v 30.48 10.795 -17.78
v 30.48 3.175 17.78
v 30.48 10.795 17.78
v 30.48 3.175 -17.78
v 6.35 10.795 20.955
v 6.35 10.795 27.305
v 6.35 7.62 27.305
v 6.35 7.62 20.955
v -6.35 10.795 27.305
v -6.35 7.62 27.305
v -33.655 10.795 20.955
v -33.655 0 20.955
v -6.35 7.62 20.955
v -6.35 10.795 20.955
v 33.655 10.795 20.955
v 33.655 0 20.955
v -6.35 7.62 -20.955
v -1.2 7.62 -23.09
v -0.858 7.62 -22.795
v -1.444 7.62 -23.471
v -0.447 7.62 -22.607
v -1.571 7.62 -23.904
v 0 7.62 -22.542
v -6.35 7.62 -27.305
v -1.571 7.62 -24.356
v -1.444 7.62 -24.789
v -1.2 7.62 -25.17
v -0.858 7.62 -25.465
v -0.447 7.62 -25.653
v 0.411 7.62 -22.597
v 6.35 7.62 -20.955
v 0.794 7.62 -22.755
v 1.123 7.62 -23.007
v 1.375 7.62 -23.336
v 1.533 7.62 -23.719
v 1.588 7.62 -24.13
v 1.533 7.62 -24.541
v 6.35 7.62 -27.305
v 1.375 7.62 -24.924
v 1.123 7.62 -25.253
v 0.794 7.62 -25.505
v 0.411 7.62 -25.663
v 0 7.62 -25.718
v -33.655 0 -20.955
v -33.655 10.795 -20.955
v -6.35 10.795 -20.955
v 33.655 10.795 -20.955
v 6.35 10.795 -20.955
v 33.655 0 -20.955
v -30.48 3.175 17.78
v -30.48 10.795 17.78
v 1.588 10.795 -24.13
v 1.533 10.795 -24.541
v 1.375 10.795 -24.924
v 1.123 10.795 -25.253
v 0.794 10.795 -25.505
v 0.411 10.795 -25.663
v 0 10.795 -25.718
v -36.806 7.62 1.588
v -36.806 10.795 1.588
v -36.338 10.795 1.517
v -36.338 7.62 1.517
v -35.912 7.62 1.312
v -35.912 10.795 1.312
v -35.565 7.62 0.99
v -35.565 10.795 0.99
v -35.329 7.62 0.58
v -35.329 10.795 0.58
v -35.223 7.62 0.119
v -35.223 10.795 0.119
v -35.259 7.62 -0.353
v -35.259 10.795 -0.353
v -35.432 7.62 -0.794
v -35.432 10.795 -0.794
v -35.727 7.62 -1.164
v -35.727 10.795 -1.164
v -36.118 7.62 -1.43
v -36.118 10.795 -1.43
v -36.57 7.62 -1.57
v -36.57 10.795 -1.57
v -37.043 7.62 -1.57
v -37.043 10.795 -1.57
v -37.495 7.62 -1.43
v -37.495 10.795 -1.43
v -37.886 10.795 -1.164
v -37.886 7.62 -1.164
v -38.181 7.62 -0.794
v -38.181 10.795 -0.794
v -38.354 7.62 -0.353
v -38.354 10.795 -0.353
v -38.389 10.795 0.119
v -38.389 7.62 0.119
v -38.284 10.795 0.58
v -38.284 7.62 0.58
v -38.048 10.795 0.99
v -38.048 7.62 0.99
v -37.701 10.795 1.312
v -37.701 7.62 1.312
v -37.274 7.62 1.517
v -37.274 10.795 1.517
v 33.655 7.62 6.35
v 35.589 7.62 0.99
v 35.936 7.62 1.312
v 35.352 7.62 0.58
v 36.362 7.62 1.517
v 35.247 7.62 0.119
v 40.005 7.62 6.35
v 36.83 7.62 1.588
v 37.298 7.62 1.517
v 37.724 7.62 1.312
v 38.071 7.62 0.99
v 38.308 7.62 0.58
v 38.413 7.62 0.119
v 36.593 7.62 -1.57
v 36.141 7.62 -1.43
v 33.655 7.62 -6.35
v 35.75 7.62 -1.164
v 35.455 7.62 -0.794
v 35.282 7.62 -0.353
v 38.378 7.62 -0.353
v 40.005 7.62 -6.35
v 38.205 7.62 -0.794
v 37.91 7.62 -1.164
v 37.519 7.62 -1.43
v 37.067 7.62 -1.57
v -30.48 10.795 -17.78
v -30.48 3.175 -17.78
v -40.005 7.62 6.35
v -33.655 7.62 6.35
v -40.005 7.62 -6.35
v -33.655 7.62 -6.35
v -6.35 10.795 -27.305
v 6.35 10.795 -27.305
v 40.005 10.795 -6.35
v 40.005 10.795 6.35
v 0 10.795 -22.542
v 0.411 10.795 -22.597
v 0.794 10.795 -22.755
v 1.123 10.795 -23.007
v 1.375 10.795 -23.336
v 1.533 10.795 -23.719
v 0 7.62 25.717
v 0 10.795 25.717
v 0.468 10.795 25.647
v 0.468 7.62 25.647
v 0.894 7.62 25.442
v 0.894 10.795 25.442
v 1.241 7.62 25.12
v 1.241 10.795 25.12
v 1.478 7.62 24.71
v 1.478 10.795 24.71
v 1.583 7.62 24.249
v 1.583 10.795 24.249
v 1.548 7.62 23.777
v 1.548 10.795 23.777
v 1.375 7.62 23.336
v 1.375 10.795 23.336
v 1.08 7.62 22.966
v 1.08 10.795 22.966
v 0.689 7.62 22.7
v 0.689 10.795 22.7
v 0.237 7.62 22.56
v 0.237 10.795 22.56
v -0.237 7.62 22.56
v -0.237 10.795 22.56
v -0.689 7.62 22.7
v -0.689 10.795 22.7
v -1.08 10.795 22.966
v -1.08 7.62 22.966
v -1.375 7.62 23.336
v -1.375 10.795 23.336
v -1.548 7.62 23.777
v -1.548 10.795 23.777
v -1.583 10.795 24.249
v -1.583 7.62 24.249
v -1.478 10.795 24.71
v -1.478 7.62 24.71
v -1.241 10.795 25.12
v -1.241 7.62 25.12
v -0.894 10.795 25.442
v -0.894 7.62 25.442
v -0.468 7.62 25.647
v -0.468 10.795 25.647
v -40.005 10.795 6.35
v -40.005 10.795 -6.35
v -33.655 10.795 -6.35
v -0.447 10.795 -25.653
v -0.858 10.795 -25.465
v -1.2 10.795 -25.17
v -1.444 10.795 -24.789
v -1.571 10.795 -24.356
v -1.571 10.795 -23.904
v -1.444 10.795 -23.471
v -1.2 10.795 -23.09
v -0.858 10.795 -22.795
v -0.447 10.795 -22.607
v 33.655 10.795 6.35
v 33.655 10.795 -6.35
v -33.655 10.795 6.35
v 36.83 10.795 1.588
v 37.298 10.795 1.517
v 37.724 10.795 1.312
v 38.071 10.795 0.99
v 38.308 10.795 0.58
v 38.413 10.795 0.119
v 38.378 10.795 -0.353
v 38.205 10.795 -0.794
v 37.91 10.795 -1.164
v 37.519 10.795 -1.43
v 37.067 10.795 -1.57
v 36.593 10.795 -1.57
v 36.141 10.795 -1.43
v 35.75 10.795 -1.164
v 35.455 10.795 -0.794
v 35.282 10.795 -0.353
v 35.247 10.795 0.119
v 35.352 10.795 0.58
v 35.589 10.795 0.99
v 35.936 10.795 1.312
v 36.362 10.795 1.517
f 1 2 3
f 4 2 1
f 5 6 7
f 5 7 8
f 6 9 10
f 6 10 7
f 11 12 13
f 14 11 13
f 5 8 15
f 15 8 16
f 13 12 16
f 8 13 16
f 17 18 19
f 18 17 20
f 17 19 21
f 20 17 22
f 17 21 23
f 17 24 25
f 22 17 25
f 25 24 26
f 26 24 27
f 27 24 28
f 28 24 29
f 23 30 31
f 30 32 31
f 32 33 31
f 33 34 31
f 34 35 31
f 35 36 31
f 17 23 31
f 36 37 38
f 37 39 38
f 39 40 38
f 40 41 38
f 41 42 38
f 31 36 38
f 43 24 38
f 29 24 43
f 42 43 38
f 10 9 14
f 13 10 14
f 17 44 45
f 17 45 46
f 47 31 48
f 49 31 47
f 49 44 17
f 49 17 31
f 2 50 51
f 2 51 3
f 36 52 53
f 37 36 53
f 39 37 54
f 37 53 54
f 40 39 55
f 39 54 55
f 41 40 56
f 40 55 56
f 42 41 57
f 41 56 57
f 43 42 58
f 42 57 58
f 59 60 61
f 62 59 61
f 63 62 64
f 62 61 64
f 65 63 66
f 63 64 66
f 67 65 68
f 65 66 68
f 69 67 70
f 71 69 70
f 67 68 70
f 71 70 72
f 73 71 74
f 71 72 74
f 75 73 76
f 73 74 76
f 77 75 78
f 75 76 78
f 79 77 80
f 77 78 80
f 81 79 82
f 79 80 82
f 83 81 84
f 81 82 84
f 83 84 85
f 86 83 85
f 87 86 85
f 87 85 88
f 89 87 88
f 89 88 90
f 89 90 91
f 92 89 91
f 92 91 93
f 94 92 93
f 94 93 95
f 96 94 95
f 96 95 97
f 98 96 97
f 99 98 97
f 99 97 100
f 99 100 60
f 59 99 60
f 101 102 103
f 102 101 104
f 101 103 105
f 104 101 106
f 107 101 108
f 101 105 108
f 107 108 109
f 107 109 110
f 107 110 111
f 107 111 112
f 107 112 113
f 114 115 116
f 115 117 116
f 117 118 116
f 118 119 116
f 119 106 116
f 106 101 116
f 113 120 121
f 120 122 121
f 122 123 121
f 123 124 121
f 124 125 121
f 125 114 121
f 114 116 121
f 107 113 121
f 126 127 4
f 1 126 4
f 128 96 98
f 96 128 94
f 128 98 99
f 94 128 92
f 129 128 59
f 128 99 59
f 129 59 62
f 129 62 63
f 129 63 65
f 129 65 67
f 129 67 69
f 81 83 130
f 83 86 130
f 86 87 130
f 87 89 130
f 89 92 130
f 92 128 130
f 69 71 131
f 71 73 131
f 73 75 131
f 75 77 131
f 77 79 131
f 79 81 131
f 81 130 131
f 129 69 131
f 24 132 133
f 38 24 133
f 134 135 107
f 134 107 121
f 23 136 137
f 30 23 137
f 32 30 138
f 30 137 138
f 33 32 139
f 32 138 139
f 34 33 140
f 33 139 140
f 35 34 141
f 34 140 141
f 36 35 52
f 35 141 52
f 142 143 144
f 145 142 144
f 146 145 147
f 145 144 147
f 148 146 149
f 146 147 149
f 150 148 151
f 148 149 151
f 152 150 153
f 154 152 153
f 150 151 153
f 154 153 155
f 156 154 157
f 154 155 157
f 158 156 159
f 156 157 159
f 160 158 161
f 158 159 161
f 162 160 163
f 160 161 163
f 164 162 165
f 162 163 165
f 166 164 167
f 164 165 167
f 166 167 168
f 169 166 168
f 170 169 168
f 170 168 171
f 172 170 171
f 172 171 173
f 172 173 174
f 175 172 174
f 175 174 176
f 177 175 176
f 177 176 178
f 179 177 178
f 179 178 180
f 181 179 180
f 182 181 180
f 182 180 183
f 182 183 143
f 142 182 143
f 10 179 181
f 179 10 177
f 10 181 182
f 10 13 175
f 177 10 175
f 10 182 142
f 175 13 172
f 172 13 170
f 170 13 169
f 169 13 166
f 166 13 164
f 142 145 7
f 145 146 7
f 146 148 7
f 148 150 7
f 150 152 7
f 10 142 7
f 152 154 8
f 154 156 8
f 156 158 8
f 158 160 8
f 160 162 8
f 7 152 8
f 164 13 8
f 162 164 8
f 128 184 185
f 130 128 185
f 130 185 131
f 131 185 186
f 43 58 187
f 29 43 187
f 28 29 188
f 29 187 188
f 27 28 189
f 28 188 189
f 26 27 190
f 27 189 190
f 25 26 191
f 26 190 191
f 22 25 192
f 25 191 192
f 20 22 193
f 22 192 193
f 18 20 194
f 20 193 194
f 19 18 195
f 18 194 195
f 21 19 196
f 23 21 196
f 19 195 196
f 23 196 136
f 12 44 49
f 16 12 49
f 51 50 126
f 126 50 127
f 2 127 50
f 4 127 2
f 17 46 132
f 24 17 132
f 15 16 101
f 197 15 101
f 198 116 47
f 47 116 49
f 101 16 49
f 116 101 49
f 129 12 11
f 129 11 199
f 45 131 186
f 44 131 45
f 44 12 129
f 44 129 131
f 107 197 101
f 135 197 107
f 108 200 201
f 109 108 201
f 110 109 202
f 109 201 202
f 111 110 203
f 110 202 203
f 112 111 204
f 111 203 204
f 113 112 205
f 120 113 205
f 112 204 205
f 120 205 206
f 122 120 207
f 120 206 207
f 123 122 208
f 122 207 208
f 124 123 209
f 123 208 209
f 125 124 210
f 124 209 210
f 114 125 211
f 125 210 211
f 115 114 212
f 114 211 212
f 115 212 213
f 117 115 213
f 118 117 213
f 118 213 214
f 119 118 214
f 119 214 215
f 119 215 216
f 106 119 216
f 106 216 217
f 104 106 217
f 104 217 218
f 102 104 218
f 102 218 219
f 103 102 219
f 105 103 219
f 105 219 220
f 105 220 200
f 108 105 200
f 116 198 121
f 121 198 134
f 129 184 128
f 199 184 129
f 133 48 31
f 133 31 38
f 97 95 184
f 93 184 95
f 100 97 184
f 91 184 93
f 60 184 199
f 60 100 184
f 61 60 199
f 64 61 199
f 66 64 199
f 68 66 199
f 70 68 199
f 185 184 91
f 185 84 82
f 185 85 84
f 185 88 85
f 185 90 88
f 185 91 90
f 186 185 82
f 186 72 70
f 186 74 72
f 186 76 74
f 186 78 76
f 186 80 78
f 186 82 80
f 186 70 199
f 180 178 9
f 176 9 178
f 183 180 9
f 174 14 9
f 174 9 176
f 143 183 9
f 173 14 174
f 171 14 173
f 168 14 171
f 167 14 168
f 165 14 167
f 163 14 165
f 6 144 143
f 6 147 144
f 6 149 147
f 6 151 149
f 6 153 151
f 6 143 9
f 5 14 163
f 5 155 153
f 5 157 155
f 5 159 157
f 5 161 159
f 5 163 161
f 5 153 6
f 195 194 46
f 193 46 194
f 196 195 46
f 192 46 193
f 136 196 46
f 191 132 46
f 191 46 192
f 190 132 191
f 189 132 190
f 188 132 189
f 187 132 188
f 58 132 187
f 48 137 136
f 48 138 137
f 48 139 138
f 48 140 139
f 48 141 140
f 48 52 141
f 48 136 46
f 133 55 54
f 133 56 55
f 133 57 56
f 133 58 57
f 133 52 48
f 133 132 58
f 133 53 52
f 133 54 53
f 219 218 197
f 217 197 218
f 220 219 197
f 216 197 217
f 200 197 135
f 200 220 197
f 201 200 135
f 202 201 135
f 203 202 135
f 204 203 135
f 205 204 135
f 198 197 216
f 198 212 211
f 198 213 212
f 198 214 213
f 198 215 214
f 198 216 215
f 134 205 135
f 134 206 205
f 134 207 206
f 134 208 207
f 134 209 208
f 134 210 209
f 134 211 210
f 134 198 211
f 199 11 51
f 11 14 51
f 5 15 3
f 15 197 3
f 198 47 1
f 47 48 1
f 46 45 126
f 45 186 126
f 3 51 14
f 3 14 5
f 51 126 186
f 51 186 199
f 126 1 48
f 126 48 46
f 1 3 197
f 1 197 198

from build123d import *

# Parameters (mm, degrees)
SKETCH1_W           = 67.31
SKETCH1_H           = 41.91
BOSS_EXTRUDE5_DEPTH = 3.175
SKETCH2_W           = 67.31
SKETCH2_H           = 41.91
SKETCH2_W_2         = 60.96
SKETCH2_H_2         = 35.56
BOSS_EXTRUDE6_DEPTH = 7.62
SKETCH4_W           = 12.7
SKETCH4_H           = 6.35
SKETCH4_W_2         = 6.35
SKETCH4_H_2         = 12.7
BOSS_EXTRUDE8_DEPTH = 3.175
SKETCH6_R           = 1.5875
CUT_EXTRUDE1_DEPTH  = 50.62353348


with BuildPart() as part:
    # Sketch1 → Boss-Extrude5 (new body)
    with BuildSketch(Plane(origin=(0, 0, 0), x_dir=(1, 0, 0), z_dir=(0, 1, 0))):
        Rectangle(SKETCH1_W, SKETCH1_H)
    extrude(amount=BOSS_EXTRUDE5_DEPTH)

    # Sketch2 → Boss-Extrude6 (add)
    with BuildSketch(Plane(origin=(0, 3.175, 0), x_dir=(1, 0, 0), z_dir=(0, 1, 0))):
        Rectangle(SKETCH2_W, SKETCH2_H)
        Rectangle(SKETCH2_W_2, SKETCH2_H_2, mode=Mode.SUBTRACT)
    extrude(amount=BOSS_EXTRUDE6_DEPTH)

    # Sketch4 → Boss-Extrude8 (add)
    with BuildSketch(Plane(origin=(0, 10.795, 0), x_dir=(1, 0, 0), z_dir=(0, 1, 0))):
        with Locations((0, -24.13)):
            Rectangle(SKETCH4_W, SKETCH4_H)
        with Locations((0, 24.13)):
            Rectangle(SKETCH4_W, SKETCH4_H)
        with Locations((36.83, 0)):
            Rectangle(SKETCH4_W_2, SKETCH4_H_2)
        with Locations((-36.83, 0)):
            Rectangle(SKETCH4_W_2, SKETCH4_H_2)
    extrude(amount=-BOSS_EXTRUDE8_DEPTH)

    # Sketch6 → Cut-Extrude1 (cut, through all)
    with BuildSketch(Plane(origin=(0, 10.795, 0), x_dir=(1, 0, 0), z_dir=(0, 1, 0))):
        with BuildLine():
            ThreePointArc((0, 25.7175), (-1.5875, 24.13), (0, 22.5425))
            Line((0, 22.5425), (0, 25.7175))
        make_face()
        with BuildLine():
            Line((0, 25.7175), (0, 22.5425))
            ThreePointArc((0, 22.5425), (1.122532015, 23.007467985), (1.5875, 24.13))
            ThreePointArc((1.5875, 24.13), (1.122532015, 25.252532015), (0, 25.7175))
        make_face()
        with Locations(Location((-36.806414665, 0, 0), (0, 0, 270))):
            Circle(SKETCH6_R)
        with Locations(Location((36.83, 0, 0), (0, 0, 270))):
            Circle(SKETCH6_R)
        with Locations(Location((0, -24.13, 0), (0, 0, 270))):
            Circle(SKETCH6_R)
    extrude(amount=-CUT_EXTRUDE1_DEPTH, mode=Mode.SUBTRACT)


solid = part.part
